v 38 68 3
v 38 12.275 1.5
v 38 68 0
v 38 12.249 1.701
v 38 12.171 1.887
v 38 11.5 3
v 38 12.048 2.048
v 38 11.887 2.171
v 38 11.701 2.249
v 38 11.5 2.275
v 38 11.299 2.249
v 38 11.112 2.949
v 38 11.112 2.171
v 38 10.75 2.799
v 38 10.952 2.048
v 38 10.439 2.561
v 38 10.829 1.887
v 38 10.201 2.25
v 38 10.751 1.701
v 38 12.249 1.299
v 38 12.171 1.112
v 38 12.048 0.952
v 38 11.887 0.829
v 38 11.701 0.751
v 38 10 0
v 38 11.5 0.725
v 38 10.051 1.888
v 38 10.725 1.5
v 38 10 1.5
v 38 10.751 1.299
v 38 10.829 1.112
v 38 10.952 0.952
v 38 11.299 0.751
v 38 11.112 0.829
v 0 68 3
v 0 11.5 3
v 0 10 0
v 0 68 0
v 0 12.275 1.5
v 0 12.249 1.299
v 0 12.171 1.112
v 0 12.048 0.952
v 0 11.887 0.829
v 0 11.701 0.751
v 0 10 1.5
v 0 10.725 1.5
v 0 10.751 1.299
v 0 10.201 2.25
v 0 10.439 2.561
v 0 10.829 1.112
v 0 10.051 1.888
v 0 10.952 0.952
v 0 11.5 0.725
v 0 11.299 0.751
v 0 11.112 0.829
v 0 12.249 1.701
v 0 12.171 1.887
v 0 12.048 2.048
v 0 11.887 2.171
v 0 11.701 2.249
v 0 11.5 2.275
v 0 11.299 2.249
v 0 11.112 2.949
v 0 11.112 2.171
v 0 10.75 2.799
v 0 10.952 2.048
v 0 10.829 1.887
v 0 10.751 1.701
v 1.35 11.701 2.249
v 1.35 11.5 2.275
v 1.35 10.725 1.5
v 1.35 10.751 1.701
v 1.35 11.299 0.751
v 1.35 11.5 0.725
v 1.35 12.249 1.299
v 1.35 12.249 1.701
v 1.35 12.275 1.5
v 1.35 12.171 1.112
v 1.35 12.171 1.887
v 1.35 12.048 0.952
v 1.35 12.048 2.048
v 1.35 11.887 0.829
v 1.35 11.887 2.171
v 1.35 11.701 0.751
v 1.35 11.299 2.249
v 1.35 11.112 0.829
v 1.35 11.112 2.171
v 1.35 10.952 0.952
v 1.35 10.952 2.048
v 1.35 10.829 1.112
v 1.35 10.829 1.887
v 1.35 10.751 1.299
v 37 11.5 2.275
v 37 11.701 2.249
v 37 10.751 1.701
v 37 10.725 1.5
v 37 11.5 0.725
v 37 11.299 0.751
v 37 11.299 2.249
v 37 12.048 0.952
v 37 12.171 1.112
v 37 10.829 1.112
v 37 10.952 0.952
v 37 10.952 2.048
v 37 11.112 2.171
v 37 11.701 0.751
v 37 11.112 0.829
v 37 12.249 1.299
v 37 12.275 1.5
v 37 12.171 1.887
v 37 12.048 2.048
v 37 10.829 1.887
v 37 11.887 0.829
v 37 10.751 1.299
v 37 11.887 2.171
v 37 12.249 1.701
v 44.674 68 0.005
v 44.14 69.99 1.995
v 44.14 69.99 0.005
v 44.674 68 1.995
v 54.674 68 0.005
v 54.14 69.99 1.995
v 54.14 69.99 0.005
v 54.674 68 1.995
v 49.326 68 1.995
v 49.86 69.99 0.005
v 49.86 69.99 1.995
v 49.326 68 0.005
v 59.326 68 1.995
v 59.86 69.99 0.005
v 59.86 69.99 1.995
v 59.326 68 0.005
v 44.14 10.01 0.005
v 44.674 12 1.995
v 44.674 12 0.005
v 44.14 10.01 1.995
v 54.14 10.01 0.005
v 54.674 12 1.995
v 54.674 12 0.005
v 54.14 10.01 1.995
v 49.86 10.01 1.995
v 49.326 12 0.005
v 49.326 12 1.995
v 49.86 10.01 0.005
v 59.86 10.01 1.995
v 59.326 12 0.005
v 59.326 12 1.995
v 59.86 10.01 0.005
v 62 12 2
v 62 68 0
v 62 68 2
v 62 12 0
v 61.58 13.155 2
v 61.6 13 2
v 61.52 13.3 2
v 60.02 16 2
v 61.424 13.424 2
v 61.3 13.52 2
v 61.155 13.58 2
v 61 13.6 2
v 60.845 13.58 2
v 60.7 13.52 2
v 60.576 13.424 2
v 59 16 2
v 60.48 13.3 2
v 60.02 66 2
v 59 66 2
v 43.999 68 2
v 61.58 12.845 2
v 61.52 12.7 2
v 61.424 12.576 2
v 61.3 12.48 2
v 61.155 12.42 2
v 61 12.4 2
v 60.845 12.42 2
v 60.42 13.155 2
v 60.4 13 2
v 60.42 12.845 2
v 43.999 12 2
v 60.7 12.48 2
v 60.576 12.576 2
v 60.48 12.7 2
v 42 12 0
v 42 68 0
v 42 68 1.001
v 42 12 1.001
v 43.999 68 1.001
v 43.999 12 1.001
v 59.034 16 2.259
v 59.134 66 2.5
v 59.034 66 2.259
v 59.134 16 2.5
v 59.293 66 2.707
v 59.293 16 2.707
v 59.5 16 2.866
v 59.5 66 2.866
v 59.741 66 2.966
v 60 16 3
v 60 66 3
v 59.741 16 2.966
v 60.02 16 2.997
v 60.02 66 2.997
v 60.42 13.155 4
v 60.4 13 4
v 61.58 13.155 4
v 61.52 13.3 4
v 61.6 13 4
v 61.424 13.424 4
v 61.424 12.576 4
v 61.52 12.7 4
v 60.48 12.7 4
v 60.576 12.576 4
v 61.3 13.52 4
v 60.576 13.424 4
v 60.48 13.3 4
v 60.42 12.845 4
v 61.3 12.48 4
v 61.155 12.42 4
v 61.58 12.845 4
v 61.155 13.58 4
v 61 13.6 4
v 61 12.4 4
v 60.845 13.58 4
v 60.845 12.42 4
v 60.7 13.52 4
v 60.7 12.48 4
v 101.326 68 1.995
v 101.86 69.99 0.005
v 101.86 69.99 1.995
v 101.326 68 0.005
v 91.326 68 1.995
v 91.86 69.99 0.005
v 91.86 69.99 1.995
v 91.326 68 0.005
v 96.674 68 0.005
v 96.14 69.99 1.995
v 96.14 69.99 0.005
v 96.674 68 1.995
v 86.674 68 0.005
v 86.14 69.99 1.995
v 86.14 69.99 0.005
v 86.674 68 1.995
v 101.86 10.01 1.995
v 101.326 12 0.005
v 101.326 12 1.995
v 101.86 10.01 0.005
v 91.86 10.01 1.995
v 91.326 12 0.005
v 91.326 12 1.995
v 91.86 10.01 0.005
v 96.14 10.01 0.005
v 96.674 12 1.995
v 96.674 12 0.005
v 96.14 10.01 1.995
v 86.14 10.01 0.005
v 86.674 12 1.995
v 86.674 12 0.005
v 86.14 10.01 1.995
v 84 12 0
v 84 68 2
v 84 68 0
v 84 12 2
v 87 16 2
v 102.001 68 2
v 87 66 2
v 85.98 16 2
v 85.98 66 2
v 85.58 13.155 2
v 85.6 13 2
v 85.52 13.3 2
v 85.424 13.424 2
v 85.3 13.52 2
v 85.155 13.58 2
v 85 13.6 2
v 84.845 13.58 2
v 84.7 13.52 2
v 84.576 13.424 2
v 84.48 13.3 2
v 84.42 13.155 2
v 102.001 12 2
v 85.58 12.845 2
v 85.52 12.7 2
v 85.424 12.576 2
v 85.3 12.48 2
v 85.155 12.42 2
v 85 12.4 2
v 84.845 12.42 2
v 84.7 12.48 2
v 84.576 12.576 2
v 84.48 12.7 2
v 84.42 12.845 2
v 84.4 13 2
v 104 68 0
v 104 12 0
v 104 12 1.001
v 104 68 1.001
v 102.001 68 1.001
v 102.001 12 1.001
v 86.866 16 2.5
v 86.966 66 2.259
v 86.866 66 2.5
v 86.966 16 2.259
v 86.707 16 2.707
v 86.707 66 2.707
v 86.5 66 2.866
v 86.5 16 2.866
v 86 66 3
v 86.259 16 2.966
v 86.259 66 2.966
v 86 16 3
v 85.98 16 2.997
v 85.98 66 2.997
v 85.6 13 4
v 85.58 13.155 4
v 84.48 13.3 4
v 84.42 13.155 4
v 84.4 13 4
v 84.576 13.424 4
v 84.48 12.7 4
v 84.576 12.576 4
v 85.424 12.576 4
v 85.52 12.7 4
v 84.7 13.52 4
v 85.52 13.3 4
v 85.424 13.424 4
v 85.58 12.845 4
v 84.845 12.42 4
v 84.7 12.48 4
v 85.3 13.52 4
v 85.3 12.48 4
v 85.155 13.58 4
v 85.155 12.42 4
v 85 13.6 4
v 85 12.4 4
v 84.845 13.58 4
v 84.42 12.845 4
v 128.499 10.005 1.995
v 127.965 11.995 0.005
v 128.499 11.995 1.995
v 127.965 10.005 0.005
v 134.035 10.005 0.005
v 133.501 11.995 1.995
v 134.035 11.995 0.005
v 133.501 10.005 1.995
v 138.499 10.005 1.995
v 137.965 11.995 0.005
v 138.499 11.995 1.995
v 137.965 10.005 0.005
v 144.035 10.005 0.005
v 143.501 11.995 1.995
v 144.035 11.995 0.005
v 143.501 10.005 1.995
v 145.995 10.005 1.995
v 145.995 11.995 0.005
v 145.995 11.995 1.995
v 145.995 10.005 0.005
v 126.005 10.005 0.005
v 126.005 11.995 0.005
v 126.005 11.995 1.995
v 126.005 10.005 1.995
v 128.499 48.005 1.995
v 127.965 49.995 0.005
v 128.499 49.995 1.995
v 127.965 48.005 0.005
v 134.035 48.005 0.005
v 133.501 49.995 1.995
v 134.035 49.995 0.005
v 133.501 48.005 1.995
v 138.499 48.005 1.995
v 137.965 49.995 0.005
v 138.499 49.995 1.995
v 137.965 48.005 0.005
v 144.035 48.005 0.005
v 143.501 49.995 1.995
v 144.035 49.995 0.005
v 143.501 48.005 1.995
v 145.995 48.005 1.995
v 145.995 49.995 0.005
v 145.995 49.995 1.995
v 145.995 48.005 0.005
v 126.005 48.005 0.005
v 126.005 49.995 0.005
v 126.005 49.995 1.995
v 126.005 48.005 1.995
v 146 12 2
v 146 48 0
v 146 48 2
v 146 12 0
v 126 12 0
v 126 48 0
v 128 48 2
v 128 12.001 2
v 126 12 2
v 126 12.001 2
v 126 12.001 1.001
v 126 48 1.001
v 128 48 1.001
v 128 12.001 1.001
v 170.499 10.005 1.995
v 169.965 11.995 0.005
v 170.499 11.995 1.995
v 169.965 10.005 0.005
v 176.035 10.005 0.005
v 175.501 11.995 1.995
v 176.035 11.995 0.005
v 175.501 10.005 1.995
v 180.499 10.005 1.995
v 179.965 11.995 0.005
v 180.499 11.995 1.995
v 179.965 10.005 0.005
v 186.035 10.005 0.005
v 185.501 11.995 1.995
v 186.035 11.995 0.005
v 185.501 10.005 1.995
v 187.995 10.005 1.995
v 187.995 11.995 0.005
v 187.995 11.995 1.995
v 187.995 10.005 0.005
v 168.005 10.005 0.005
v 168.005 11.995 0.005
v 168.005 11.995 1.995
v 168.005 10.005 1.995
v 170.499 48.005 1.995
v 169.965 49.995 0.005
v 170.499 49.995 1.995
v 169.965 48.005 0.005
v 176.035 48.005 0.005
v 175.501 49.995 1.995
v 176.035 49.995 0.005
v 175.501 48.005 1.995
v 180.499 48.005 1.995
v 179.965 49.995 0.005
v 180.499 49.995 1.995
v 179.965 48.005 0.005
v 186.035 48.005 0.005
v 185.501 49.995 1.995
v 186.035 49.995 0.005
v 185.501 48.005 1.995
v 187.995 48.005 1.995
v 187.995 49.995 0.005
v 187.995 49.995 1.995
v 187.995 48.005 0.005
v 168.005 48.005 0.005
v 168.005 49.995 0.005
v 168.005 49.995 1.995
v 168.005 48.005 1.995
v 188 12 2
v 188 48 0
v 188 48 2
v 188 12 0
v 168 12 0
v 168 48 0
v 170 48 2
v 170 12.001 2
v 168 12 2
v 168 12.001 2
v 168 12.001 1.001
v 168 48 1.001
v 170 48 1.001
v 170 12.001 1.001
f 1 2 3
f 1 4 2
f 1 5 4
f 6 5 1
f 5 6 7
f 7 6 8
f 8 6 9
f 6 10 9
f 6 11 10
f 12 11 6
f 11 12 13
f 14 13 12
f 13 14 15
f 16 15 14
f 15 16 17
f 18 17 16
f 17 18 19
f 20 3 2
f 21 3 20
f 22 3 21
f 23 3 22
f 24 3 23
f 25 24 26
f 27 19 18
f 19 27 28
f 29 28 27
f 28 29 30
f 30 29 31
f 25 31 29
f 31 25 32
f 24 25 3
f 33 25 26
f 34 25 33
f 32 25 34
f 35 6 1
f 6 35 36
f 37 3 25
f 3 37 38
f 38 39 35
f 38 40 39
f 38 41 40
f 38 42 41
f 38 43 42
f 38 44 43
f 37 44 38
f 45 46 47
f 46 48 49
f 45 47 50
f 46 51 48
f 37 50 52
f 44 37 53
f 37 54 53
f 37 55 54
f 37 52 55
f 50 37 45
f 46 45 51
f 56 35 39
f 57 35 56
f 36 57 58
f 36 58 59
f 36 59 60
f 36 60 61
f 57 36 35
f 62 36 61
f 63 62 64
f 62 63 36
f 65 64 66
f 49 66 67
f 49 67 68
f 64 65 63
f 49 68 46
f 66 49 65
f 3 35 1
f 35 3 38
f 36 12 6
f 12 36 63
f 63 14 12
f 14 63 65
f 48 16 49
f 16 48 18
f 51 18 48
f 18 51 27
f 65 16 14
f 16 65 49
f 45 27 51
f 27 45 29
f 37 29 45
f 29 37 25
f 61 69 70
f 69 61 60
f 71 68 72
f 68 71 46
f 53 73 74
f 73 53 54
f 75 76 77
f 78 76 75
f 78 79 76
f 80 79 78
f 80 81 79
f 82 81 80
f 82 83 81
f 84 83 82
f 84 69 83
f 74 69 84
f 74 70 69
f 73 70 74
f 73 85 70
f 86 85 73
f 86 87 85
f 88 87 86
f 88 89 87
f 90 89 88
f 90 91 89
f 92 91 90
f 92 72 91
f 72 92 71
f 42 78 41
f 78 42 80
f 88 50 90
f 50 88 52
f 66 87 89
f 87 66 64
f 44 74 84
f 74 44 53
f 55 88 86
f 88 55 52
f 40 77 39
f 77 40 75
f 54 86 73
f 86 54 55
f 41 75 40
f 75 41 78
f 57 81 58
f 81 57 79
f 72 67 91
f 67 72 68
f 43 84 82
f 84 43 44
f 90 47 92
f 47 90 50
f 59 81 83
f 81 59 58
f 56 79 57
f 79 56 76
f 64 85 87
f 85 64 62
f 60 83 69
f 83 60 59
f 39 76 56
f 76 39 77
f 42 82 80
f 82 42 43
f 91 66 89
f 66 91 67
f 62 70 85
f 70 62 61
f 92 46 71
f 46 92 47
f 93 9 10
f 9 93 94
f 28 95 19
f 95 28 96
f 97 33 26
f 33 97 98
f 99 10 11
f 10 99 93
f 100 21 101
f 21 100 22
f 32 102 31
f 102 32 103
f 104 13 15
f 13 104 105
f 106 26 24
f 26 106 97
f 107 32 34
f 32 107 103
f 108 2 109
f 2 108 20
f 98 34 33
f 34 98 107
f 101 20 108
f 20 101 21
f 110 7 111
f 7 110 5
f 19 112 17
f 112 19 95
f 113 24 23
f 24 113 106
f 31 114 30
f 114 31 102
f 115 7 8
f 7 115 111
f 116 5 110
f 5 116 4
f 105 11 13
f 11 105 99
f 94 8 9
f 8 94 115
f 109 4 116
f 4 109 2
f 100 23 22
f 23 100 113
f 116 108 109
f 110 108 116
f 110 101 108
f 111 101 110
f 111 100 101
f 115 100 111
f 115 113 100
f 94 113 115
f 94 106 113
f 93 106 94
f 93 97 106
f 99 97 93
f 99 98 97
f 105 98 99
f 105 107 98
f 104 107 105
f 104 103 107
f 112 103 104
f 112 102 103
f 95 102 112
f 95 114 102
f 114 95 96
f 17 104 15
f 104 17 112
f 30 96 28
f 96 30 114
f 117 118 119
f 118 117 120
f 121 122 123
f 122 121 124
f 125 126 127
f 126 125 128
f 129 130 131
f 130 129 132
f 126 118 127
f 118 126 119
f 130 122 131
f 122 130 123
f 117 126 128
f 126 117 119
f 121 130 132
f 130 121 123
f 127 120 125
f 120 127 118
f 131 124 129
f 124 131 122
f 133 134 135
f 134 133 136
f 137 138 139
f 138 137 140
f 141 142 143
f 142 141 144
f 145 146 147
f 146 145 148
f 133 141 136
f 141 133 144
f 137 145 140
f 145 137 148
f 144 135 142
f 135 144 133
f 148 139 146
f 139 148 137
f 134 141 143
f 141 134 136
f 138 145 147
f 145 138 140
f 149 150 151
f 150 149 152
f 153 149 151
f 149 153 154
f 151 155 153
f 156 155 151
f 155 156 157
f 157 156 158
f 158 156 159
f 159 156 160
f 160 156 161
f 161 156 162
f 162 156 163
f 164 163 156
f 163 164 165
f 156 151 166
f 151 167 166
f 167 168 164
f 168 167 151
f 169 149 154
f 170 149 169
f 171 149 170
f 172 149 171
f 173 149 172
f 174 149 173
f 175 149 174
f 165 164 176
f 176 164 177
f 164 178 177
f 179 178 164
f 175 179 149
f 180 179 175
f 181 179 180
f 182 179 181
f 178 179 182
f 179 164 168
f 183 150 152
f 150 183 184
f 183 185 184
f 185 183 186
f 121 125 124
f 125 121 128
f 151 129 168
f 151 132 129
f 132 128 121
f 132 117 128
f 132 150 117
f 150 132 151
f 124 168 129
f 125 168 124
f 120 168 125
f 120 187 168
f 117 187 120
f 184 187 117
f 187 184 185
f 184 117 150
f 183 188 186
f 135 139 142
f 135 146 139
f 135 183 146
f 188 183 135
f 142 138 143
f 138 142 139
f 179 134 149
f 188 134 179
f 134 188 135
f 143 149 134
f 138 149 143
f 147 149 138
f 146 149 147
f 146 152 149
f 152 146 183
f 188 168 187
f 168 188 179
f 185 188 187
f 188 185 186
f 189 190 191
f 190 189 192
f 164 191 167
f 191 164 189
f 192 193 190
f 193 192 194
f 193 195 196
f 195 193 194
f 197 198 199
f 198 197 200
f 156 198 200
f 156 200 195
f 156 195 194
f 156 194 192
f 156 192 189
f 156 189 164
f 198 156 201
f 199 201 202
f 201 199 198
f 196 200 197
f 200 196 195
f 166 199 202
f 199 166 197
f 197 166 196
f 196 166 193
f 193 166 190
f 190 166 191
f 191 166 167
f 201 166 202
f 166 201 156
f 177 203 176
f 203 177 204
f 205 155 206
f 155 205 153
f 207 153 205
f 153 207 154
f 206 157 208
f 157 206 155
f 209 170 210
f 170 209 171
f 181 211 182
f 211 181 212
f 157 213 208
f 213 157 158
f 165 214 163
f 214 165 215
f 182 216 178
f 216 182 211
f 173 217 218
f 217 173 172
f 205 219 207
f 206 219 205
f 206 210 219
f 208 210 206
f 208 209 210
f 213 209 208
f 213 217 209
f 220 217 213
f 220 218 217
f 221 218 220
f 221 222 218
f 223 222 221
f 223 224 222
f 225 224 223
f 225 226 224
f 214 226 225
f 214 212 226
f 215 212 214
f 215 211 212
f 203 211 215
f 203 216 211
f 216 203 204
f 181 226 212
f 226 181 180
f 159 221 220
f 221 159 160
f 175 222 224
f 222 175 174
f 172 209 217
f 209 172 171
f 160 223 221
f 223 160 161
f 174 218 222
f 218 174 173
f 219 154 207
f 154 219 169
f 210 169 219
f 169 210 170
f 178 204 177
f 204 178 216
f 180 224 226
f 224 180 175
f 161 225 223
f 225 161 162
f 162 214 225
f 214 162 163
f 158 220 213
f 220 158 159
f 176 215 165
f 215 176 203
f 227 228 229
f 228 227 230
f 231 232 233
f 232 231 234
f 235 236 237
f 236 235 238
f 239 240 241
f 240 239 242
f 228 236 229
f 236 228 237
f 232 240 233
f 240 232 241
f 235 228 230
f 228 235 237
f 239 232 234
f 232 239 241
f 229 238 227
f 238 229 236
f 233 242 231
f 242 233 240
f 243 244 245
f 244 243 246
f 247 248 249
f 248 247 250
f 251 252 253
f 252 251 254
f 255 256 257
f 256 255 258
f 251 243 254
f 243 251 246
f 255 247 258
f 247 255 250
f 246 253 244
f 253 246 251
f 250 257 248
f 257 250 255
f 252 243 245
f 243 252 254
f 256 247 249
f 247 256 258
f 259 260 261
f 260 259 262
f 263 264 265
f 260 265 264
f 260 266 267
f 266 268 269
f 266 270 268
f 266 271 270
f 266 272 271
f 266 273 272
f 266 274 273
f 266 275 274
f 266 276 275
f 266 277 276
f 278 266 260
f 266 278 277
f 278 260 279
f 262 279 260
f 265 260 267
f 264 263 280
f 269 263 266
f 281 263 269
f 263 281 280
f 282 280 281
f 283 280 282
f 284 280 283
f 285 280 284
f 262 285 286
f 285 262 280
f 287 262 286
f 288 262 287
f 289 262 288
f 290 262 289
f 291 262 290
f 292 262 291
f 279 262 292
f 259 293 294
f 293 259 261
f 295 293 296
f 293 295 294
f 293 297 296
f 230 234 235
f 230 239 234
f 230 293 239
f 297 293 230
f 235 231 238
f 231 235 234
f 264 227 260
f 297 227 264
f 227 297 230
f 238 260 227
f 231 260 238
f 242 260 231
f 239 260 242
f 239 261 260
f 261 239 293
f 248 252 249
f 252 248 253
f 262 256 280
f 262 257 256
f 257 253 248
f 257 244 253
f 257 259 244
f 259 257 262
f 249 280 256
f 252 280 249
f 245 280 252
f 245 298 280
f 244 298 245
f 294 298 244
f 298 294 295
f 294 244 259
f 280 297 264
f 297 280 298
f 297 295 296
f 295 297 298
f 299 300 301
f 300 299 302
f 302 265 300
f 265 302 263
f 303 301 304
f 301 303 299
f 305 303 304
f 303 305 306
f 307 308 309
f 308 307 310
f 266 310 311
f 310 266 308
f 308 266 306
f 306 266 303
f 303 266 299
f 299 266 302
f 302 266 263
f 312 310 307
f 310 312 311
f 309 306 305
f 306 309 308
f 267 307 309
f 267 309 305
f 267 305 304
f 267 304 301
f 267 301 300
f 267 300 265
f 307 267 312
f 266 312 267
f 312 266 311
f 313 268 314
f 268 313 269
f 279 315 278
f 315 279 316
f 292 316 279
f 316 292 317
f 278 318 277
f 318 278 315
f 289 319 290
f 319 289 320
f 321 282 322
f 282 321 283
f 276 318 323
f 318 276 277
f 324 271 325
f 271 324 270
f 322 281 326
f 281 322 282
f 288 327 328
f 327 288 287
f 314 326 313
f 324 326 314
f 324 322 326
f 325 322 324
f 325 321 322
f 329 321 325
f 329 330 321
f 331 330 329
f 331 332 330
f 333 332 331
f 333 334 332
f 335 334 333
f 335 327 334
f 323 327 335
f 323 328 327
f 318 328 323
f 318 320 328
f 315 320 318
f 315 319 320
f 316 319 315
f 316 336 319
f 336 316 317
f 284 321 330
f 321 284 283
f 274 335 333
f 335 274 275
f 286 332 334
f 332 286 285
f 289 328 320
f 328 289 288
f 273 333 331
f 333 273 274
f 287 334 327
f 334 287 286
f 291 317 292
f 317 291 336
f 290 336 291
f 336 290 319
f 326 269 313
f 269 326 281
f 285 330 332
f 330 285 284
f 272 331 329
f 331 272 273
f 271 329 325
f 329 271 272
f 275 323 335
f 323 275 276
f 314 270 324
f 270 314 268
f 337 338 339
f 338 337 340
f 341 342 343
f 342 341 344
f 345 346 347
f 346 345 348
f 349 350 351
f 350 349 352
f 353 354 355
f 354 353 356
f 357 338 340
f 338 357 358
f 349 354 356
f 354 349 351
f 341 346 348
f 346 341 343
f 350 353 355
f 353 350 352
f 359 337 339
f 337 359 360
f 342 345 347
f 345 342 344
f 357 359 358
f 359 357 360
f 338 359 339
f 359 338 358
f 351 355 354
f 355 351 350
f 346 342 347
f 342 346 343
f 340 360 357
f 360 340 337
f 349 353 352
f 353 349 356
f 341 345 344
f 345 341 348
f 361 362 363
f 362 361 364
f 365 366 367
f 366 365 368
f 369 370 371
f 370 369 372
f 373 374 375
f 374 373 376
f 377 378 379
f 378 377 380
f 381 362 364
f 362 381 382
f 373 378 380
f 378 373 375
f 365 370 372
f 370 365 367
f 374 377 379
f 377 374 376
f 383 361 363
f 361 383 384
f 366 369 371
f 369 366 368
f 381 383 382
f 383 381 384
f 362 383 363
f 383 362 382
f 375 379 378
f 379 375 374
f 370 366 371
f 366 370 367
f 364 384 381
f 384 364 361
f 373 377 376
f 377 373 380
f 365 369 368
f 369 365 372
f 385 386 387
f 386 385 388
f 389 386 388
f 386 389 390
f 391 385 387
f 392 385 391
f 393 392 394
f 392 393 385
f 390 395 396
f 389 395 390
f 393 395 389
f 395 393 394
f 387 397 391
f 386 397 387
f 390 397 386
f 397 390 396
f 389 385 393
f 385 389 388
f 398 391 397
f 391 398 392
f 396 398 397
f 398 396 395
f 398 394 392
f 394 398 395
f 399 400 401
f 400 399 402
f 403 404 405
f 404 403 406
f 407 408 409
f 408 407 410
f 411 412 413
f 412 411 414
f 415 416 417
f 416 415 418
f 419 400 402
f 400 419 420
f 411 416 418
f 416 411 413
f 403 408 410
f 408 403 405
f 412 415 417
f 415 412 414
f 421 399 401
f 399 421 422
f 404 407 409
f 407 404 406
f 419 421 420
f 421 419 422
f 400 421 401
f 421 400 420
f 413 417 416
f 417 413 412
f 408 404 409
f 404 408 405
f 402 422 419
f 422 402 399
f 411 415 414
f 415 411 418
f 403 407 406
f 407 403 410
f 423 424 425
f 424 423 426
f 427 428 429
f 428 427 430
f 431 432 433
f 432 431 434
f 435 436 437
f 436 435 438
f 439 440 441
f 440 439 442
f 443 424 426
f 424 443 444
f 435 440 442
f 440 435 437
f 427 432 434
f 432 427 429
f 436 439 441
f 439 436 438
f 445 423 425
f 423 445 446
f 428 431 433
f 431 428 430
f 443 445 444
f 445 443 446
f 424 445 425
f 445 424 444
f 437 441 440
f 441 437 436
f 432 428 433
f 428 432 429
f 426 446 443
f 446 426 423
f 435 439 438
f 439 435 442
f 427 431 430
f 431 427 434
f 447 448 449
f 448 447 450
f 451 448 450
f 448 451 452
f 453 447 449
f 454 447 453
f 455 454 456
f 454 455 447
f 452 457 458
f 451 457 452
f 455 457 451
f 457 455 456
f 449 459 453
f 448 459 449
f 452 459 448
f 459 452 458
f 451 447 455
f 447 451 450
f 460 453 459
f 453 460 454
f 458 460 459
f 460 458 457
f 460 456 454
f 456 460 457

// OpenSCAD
// file: ../lib/dovetails.scad
// Source: https://github.com/cfinke/OpenSCAD-Dovetails

/**
 * pin_length is measured along the same axis as the length of the board.
 * pin_width is the width of the bottom of the pins, where they're widest.
 * pin_thickness is measured along the same axis as the board thickness.
 * tail_width is the width of the tails where they meet the bottom of the pins, where they're narrowest.
 */
module dovetail_pins(pin_length=.75, pin_width=1, pin_thickness=.75, pin_count=4, angle=15, tail_width=1) {
    intersection() {
        translate([0.005, 0.005, 0.005]) cube([(pin_count-1)*(pin_width+tail_width)-0.01, pin_length-0.01, pin_thickness-0.01]);
        dovetail_pins_idealized(
            pin_length=pin_length,
            pin_width=pin_width,
            pin_thickness=pin_thickness,
            pin_count=pin_count,
            angle=angle,
            tail_width=tail_width
        );
    }
}

/**
 * tail_length is measured along the same axis as the length of the board.
 * tail_width is the width of the tails where they meet the board, where they're narrowest.
 * tail_thickness is measured along the same axis as the board thickness.
 * pin_width is the width of the bottom of the pins, where they're widest.
 */
module dovetail_tails(tail_length=.75, tail_width=1, tail_thickness=.75, tail_count=3, angle=15, pin_width=1) {
    pin_count = tail_count + 1;
    pin_thickness = tail_length;
    pin_length = tail_thickness;
    
    translate([0, 0, tail_thickness]) {
        rotate([-90, 0, 0]) {
            translate([0, 0, -0.005]) {
                difference() {
                    translate([0.005, 0.005, 0.005]) {
                        cube([(pin_count-1)*(pin_width+tail_width)-0.01, tail_thickness-0.01, tail_length-0.01]);
                    }

                    dovetail_pins_idealized(
                        pin_length=pin_length,
                        pin_width=pin_width,
                        pin_thickness=pin_thickness,
                        pin_count=pin_count,
                        angle=angle,
                        tail_width=tail_width
                    );
                }
            }
        }
    }
}

/**
 * Used for generating both pins and tails. Don't call this directly.
 */
module dovetail_pins_idealized(
    pin_length=.75,
    pin_width=1,
    pin_thickness=.75,
    pin_count=4,
    angle=15,
    tail_width=1) {
        
    pin_width_top = pin_width - ( 2 * tan(angle) * pin_thickness );
    
    translate([0, pin_length, 0]) {
        rotate([90, 0, 0]) {
            intersection() {
                cube([(pin_count-1)*(pin_width+tail_width), pin_thickness, pin_length]);
                
                for (pin = [0:pin_count-1]) {
                    translate([pin * (pin_width + tail_width), 0]) {
                        linear_extrude(pin_length) {
                            polygon([
                                [-pin_width/2, 0], 
                                [-pin_width_top/2, pin_thickness],
                                [pin_width_top/2, pin_thickness],
                                [pin_width/2, 0]
                            ]);
                        }
                    }
                }
            }
        }
    }
}

/**
 * Determine the width the pins need to be once the tail widths are chosen.
 */
function pin_width (tail_width, tail_count, board_width) = ( board_width - (tail_width * tail_count) ) / (tail_count);

/**
 * Construct a board with tails cut into it. board_length includes the length of the tails.
 */
module board_with_dovetail_tails(board_length, board_width, board_thickness, tail_length, tail_width, pin_width, tail_count, angle) {
    
    tail_thickness = board_thickness;
    
    pin_width = pin_width(tail_width = tail_width, tail_count=tail_count, board_width=board_width);
    translate([0, board_length - ( 2 * tail_length) + tail_length, 0]) {
        dovetail_tails(tail_length=tail_length, tail_width=tail_width, tail_thickness=tail_thickness, tail_count=tail_count, angle=angle, pin_width=pin_width);
    }
    translate([0, tail_length, 0]) cube([board_width, board_length - ( 2 * tail_length), board_thickness]);
    translate([0, tail_length, 0]) mirror([0,1,0]) dovetail_tails(tail_length=tail_length, tail_width=tail_width, tail_thickness=tail_thickness, tail_count=tail_count, angle=angle, pin_width=pin_width);
}

/**
 * Construct a board with pins cut into it. board_length includes the length of the pins.
 */
module board_with_dovetail_pins(board_length, board_width, board_thickness, pin_length, tail_width, pin_width, pin_count, angle) {
    translate([0, board_length - ( 2 * pin_length) + pin_length, 0]) {
        dovetail_pins(pin_length=pin_length, pin_width=pin_width, pin_thickness=board_thickness, pin_count=pin_count, angle=angle, tail_width=tail_width);
    }
    translate([0, pin_length, 0]) cube([board_width, board_length - ( 2 * pin_length), board_thickness]);
        dovetail_pins(pin_length=pin_length, pin_width=pin_width, pin_thickness=board_thickness, pin_count=pin_count, angle=angle, tail_width=tail_width);
}

// An example set of boards.
tail_width = .75;
tail_count = 3;
board_width = 4;
angle = 15;
board_thickness = 0.5;
pin_width = pin_width(tail_width = tail_width, tail_count=tail_count, board_width=board_width);

board_with_dovetail_tails(
    board_length=8,
    board_width=board_width,
    board_thickness=board_thickness,
    tail_length=.5,
    tail_width=tail_width,
    pin_width=pin_width,
    tail_count=tail_count,
    angle=angle
);

translate([board_width + 1, 0, 0]) board_with_dovetail_pins(
    board_length=6,
    board_width=board_width,
    board_thickness=board_thickness,
    pin_length=.5,
    tail_width=tail_width,
    pin_width=pin_width,
    pin_count = tail_count + 1,
    angle=angle
);
// file: ../lib/common.scad
// Common modules for use across models

epsilon=0.02;

module hollow_cylinder(h,d_inner,d_outer) {
  difference() {
    cylinder(h=h,d=d_outer);
    translate([0,0,-epsilon/2]) {
      cylinder(h=h+epsilon, d=d_inner);
    }
  }
}

module hollow_prism(h, lx_outer, lx_inner, ly_outer, ly_inner) {
  difference() {
    cube([lx_outer, ly_outer, h]);
    translate([(lx_outer-lx_inner)/2,(ly_outer-ly_inner)/2,-epsilon/2]) {
      cube([lx_inner, ly_inner,h+epsilon]);
    }
  }
}

module right_triangle(lx, ly) {
  polygon(points=[[0,0],
                  [lx,0],
                  [0,ly],
                  [0,0]]);
}

// A 2D rectangle with rounded corners
module rounded_rectangle(width, height, radius) {
  r = radius;
  x1 = r;
  y1 = r;
  x2 = width - r;
  y2 = height - r;
  hull() {
    translate([x1, y1, 0]) circle(radius);
    translate([x2, y1, 0]) circle(radius);
    translate([x1, y2, 0]) circle(radius);
    translate([x2, y2, 0]) circle(radius);
  }
}

// 3D rectangle with cylindrical rounded corners. Scale gives an optional flare to the top.
module rounded_prism(width, length, height, radius, scale=1) {
  translate([width/2, length/2]) {
    linear_extrude(height=height, scale=scale) {
      translate([-width/2, -length/2]) {
        rounded_rectangle(width, length, radius);
      }
    }
  }
}

// A squished sphere with the specified radii
module squashed_sphere(h_radius, v_radius) {
  resize([h_radius*2, h_radius*2, v_radius*2]) {
    sphere(r=h_radius);
  }
}

// 3D rectangle with spherical rounded corners
module pillowed_prism(width, length, height, h_radius, v_radius) {
  x1 = h_radius;
  y1 = x1;
  x2 = width - h_radius;
  y2 = length - h_radius;
  hull() {
    translate([x1, y1,  height/2-v_radius]) squashed_sphere(h_radius, v_radius);
    translate([x2, y1,  height/2-v_radius]) squashed_sphere(h_radius, v_radius);
    translate([x1, y2,  height/2-v_radius]) squashed_sphere(h_radius, v_radius);
    translate([x2, y2,  height/2-v_radius]) squashed_sphere(h_radius, v_radius);
    translate([x1, y1, -height/2+v_radius]) squashed_sphere(h_radius, v_radius);
    translate([x2, y1, -height/2+v_radius]) squashed_sphere(h_radius, v_radius);
    translate([x1, y2, -height/2+v_radius]) squashed_sphere(h_radius, v_radius);
    translate([x2, y2, -height/2+v_radius]) squashed_sphere(h_radius, v_radius);
  }
}

// Returns a volume that contains all of the points above or below the
// specified z
module xy(above, below)
{
  d = 10000;
  if (below == undef)
    translate([0,0,above+d/2]) cube([d,d,d] ,center=true);
  else
    translate([0,0,below-d/2]) cube([d,d,d], center=true);
}

// Lays things out in a line with labels
// TODO: Lay them out in a grid instead
module display(w, l=10, padding=2) {
  for (n = [0:2:$children-1]) {
    translate([(w + padding) * n/2, 0, 0]) {
      translate([0, l, 0]) {
        children(n+1);
      }
      color([0,0,0])
        children(n);
    }
  }
}

module quarter_cylinder(r, h) {
  difference() {
    translate([0,0,h/2]) {
      cylinder(r=r, h=h, center=true);
    }
    translate([-r*2-epsilon,-r*2,-epsilon]) {
      cube([r*2,r*4,h*2]);
    }
    translate([-r*2-epsilon,-r*2,-epsilon]) {
      cube([r*4,r*2,h*2]);
    }

  }
}
// main file
use <../lib/common.scad>;
use <../lib/dovetails.scad>;

epsilon = 0.001;

/* box_length=80; */
/* box_width=box_length * 0.6; */
/* box_height=box_length / 3; */
/* wall_thickness = 2; */

box_length=60;
box_width=40;
box_height=box_length / 3;
wall_thickness = 2;
top_thickness = wall_thickness * 1.5;

bottom_rabbet_depth = wall_thickness / 2;
bottom_rabbet_height = wall_thickness;

// How big the hinge pin is compared to the wall thickness
hinge_proportion = 0.6;

$fn = 24;

// How much space we leave around the tails/pins so they fit
fit_gap = 0.35;

tail_count = round(box_height / 5 / wall_thickness);
angle = 15;

module miter_profile(length, height) {
  w = length;
  h = height;
  polygon(points = [[0,0],
                    [w,0],
                    [w-h,h],
                    [h,h]]);
}

module end_beveled_board(length, width, thickness) {
  translate([0,0,0]) {
    rotate([90,0,90]) {
      linear_extrude(height=width) {
        miter_profile(length, thickness);
      }
    }
  }
}

module tail_board(length, width, thickness) {
  tail_width = width * 0.5 / tail_count - fit_gap;
  pin_width = pin_width(tail_width = tail_width, tail_count=tail_count, board_width=box_height);
  board_with_dovetail_tails(
    board_length=length,
    board_width=width,
    board_thickness=thickness,
    tail_length=thickness,
    tail_width=tail_width,
    pin_width=pin_width,
    tail_count=tail_count,
    angle=angle
    );
}

module pin_board(length, width, thickness) {
  tail_width = width * 0.5 / tail_count;
  pin_width = pin_width(tail_width = tail_width, tail_count=tail_count, board_width=box_height);
  board_with_dovetail_pins(
    board_length=length,
    board_width=width,
    board_thickness=thickness,
    pin_length=thickness,
    tail_width=tail_width,
    pin_width=pin_width,
    pin_count=tail_count + 1,
    angle=angle
    );
}


module mitered_dovetail_tail_board(length, width, thickness) {
  union() {
    tail_board(length, width, thickness);
    end_beveled_board(length, width, thickness);
  }
}

module mitered_dovetail_pin_board(length, width, thickness) {
  union() {
    translate([0,0,thickness]) {
      mirror([0,0,-1]) {
        pin_board(length, width, thickness);
      }
    }
    end_beveled_board(length, width, thickness);
  }
}


module side() { 
  union() {
    difference() {
      //mitered_dovetail_tail_board(box_length, box_height, wall_thickness);
      tail_board(box_length, box_height, wall_thickness);
      // Bottom rabbet
      translate([-epsilon*2,wall_thickness-epsilon,wall_thickness - bottom_rabbet_depth+epsilon]) {
        cube([bottom_rabbet_height+epsilon, box_length-2*wall_thickness+2*epsilon, bottom_rabbet_depth]);
      }
    }
    // hinge pin
    translate([box_height-wall_thickness/2,wall_thickness * 1.5,wall_thickness]) {
      cylinder(h=wall_thickness, d=wall_thickness * hinge_proportion);
    }
    // lid support
    translate([box_height-wall_thickness*2, wall_thickness*3, wall_thickness]) {
      r = wall_thickness / 2;
      h= box_length-wall_thickness*5;
      translate([wall_thickness,h,0])
        mirror([1,0,0]) {
        rotate([90, 0, 0]) {
          quarter_cylinder(r=r, h=h);
        }
      }
    }
  }
}

module front() { // export
  difference() {
    //mitered_dovetail_pin_board(box_width, box_height, wall_thickness);
    translate([0,0,wall_thickness]) {
      mirror([0,0,1]) {
        pin_board(box_width, box_height, wall_thickness);
      }
    }
    // Bottom rabbet
    translate([-epsilon,wall_thickness+epsilon,wall_thickness - bottom_rabbet_depth+epsilon]) {
      cube([bottom_rabbet_height+epsilon, box_width-2*wall_thickness+2*epsilon, bottom_rabbet_depth]);
    }
  }
}

module left() { // export
  side();
}

module right() { // export
  translate([box_height, 0, 0]) {
    mirror([1,0,0]) {
      side();
    }
  }
}

module back() { // export
  front();
}

module lid() { // export
  l = box_length-wall_thickness;
  w = box_width-wall_thickness;
  difference() {
    union() {
      translate([0, top_thickness/2, 0]) {
        cube([w, l-top_thickness/2, top_thickness]);
      }
      translate([0,top_thickness/2,top_thickness/2]) {
        rotate([0,90,0]) {
          cylinder(r=top_thickness/2, h=w);
        }
      }
      cube([w,top_thickness/2,top_thickness/2]);
    }
    translate([-wall_thickness/2, top_thickness/2, top_thickness/2]) {
      rotate([0, 90, 0]) {
        cylinder(h=wall_thickness+fit_gap, d = fit_gap + wall_thickness * hinge_proportion);
      }
    }
    translate([w-wall_thickness/2, top_thickness/2, top_thickness/2]) {
      rotate([0, 90, 0]) {
        cylinder(h=wall_thickness+fit_gap, d = fit_gap + wall_thickness * hinge_proportion);
      }
    }
  }

}

display(box_width, 10, 2) {
  text("lid"); lid();
  text("left"); left();
  text("right"); right();
  text("front"); front();
  text("back"); back();
}
